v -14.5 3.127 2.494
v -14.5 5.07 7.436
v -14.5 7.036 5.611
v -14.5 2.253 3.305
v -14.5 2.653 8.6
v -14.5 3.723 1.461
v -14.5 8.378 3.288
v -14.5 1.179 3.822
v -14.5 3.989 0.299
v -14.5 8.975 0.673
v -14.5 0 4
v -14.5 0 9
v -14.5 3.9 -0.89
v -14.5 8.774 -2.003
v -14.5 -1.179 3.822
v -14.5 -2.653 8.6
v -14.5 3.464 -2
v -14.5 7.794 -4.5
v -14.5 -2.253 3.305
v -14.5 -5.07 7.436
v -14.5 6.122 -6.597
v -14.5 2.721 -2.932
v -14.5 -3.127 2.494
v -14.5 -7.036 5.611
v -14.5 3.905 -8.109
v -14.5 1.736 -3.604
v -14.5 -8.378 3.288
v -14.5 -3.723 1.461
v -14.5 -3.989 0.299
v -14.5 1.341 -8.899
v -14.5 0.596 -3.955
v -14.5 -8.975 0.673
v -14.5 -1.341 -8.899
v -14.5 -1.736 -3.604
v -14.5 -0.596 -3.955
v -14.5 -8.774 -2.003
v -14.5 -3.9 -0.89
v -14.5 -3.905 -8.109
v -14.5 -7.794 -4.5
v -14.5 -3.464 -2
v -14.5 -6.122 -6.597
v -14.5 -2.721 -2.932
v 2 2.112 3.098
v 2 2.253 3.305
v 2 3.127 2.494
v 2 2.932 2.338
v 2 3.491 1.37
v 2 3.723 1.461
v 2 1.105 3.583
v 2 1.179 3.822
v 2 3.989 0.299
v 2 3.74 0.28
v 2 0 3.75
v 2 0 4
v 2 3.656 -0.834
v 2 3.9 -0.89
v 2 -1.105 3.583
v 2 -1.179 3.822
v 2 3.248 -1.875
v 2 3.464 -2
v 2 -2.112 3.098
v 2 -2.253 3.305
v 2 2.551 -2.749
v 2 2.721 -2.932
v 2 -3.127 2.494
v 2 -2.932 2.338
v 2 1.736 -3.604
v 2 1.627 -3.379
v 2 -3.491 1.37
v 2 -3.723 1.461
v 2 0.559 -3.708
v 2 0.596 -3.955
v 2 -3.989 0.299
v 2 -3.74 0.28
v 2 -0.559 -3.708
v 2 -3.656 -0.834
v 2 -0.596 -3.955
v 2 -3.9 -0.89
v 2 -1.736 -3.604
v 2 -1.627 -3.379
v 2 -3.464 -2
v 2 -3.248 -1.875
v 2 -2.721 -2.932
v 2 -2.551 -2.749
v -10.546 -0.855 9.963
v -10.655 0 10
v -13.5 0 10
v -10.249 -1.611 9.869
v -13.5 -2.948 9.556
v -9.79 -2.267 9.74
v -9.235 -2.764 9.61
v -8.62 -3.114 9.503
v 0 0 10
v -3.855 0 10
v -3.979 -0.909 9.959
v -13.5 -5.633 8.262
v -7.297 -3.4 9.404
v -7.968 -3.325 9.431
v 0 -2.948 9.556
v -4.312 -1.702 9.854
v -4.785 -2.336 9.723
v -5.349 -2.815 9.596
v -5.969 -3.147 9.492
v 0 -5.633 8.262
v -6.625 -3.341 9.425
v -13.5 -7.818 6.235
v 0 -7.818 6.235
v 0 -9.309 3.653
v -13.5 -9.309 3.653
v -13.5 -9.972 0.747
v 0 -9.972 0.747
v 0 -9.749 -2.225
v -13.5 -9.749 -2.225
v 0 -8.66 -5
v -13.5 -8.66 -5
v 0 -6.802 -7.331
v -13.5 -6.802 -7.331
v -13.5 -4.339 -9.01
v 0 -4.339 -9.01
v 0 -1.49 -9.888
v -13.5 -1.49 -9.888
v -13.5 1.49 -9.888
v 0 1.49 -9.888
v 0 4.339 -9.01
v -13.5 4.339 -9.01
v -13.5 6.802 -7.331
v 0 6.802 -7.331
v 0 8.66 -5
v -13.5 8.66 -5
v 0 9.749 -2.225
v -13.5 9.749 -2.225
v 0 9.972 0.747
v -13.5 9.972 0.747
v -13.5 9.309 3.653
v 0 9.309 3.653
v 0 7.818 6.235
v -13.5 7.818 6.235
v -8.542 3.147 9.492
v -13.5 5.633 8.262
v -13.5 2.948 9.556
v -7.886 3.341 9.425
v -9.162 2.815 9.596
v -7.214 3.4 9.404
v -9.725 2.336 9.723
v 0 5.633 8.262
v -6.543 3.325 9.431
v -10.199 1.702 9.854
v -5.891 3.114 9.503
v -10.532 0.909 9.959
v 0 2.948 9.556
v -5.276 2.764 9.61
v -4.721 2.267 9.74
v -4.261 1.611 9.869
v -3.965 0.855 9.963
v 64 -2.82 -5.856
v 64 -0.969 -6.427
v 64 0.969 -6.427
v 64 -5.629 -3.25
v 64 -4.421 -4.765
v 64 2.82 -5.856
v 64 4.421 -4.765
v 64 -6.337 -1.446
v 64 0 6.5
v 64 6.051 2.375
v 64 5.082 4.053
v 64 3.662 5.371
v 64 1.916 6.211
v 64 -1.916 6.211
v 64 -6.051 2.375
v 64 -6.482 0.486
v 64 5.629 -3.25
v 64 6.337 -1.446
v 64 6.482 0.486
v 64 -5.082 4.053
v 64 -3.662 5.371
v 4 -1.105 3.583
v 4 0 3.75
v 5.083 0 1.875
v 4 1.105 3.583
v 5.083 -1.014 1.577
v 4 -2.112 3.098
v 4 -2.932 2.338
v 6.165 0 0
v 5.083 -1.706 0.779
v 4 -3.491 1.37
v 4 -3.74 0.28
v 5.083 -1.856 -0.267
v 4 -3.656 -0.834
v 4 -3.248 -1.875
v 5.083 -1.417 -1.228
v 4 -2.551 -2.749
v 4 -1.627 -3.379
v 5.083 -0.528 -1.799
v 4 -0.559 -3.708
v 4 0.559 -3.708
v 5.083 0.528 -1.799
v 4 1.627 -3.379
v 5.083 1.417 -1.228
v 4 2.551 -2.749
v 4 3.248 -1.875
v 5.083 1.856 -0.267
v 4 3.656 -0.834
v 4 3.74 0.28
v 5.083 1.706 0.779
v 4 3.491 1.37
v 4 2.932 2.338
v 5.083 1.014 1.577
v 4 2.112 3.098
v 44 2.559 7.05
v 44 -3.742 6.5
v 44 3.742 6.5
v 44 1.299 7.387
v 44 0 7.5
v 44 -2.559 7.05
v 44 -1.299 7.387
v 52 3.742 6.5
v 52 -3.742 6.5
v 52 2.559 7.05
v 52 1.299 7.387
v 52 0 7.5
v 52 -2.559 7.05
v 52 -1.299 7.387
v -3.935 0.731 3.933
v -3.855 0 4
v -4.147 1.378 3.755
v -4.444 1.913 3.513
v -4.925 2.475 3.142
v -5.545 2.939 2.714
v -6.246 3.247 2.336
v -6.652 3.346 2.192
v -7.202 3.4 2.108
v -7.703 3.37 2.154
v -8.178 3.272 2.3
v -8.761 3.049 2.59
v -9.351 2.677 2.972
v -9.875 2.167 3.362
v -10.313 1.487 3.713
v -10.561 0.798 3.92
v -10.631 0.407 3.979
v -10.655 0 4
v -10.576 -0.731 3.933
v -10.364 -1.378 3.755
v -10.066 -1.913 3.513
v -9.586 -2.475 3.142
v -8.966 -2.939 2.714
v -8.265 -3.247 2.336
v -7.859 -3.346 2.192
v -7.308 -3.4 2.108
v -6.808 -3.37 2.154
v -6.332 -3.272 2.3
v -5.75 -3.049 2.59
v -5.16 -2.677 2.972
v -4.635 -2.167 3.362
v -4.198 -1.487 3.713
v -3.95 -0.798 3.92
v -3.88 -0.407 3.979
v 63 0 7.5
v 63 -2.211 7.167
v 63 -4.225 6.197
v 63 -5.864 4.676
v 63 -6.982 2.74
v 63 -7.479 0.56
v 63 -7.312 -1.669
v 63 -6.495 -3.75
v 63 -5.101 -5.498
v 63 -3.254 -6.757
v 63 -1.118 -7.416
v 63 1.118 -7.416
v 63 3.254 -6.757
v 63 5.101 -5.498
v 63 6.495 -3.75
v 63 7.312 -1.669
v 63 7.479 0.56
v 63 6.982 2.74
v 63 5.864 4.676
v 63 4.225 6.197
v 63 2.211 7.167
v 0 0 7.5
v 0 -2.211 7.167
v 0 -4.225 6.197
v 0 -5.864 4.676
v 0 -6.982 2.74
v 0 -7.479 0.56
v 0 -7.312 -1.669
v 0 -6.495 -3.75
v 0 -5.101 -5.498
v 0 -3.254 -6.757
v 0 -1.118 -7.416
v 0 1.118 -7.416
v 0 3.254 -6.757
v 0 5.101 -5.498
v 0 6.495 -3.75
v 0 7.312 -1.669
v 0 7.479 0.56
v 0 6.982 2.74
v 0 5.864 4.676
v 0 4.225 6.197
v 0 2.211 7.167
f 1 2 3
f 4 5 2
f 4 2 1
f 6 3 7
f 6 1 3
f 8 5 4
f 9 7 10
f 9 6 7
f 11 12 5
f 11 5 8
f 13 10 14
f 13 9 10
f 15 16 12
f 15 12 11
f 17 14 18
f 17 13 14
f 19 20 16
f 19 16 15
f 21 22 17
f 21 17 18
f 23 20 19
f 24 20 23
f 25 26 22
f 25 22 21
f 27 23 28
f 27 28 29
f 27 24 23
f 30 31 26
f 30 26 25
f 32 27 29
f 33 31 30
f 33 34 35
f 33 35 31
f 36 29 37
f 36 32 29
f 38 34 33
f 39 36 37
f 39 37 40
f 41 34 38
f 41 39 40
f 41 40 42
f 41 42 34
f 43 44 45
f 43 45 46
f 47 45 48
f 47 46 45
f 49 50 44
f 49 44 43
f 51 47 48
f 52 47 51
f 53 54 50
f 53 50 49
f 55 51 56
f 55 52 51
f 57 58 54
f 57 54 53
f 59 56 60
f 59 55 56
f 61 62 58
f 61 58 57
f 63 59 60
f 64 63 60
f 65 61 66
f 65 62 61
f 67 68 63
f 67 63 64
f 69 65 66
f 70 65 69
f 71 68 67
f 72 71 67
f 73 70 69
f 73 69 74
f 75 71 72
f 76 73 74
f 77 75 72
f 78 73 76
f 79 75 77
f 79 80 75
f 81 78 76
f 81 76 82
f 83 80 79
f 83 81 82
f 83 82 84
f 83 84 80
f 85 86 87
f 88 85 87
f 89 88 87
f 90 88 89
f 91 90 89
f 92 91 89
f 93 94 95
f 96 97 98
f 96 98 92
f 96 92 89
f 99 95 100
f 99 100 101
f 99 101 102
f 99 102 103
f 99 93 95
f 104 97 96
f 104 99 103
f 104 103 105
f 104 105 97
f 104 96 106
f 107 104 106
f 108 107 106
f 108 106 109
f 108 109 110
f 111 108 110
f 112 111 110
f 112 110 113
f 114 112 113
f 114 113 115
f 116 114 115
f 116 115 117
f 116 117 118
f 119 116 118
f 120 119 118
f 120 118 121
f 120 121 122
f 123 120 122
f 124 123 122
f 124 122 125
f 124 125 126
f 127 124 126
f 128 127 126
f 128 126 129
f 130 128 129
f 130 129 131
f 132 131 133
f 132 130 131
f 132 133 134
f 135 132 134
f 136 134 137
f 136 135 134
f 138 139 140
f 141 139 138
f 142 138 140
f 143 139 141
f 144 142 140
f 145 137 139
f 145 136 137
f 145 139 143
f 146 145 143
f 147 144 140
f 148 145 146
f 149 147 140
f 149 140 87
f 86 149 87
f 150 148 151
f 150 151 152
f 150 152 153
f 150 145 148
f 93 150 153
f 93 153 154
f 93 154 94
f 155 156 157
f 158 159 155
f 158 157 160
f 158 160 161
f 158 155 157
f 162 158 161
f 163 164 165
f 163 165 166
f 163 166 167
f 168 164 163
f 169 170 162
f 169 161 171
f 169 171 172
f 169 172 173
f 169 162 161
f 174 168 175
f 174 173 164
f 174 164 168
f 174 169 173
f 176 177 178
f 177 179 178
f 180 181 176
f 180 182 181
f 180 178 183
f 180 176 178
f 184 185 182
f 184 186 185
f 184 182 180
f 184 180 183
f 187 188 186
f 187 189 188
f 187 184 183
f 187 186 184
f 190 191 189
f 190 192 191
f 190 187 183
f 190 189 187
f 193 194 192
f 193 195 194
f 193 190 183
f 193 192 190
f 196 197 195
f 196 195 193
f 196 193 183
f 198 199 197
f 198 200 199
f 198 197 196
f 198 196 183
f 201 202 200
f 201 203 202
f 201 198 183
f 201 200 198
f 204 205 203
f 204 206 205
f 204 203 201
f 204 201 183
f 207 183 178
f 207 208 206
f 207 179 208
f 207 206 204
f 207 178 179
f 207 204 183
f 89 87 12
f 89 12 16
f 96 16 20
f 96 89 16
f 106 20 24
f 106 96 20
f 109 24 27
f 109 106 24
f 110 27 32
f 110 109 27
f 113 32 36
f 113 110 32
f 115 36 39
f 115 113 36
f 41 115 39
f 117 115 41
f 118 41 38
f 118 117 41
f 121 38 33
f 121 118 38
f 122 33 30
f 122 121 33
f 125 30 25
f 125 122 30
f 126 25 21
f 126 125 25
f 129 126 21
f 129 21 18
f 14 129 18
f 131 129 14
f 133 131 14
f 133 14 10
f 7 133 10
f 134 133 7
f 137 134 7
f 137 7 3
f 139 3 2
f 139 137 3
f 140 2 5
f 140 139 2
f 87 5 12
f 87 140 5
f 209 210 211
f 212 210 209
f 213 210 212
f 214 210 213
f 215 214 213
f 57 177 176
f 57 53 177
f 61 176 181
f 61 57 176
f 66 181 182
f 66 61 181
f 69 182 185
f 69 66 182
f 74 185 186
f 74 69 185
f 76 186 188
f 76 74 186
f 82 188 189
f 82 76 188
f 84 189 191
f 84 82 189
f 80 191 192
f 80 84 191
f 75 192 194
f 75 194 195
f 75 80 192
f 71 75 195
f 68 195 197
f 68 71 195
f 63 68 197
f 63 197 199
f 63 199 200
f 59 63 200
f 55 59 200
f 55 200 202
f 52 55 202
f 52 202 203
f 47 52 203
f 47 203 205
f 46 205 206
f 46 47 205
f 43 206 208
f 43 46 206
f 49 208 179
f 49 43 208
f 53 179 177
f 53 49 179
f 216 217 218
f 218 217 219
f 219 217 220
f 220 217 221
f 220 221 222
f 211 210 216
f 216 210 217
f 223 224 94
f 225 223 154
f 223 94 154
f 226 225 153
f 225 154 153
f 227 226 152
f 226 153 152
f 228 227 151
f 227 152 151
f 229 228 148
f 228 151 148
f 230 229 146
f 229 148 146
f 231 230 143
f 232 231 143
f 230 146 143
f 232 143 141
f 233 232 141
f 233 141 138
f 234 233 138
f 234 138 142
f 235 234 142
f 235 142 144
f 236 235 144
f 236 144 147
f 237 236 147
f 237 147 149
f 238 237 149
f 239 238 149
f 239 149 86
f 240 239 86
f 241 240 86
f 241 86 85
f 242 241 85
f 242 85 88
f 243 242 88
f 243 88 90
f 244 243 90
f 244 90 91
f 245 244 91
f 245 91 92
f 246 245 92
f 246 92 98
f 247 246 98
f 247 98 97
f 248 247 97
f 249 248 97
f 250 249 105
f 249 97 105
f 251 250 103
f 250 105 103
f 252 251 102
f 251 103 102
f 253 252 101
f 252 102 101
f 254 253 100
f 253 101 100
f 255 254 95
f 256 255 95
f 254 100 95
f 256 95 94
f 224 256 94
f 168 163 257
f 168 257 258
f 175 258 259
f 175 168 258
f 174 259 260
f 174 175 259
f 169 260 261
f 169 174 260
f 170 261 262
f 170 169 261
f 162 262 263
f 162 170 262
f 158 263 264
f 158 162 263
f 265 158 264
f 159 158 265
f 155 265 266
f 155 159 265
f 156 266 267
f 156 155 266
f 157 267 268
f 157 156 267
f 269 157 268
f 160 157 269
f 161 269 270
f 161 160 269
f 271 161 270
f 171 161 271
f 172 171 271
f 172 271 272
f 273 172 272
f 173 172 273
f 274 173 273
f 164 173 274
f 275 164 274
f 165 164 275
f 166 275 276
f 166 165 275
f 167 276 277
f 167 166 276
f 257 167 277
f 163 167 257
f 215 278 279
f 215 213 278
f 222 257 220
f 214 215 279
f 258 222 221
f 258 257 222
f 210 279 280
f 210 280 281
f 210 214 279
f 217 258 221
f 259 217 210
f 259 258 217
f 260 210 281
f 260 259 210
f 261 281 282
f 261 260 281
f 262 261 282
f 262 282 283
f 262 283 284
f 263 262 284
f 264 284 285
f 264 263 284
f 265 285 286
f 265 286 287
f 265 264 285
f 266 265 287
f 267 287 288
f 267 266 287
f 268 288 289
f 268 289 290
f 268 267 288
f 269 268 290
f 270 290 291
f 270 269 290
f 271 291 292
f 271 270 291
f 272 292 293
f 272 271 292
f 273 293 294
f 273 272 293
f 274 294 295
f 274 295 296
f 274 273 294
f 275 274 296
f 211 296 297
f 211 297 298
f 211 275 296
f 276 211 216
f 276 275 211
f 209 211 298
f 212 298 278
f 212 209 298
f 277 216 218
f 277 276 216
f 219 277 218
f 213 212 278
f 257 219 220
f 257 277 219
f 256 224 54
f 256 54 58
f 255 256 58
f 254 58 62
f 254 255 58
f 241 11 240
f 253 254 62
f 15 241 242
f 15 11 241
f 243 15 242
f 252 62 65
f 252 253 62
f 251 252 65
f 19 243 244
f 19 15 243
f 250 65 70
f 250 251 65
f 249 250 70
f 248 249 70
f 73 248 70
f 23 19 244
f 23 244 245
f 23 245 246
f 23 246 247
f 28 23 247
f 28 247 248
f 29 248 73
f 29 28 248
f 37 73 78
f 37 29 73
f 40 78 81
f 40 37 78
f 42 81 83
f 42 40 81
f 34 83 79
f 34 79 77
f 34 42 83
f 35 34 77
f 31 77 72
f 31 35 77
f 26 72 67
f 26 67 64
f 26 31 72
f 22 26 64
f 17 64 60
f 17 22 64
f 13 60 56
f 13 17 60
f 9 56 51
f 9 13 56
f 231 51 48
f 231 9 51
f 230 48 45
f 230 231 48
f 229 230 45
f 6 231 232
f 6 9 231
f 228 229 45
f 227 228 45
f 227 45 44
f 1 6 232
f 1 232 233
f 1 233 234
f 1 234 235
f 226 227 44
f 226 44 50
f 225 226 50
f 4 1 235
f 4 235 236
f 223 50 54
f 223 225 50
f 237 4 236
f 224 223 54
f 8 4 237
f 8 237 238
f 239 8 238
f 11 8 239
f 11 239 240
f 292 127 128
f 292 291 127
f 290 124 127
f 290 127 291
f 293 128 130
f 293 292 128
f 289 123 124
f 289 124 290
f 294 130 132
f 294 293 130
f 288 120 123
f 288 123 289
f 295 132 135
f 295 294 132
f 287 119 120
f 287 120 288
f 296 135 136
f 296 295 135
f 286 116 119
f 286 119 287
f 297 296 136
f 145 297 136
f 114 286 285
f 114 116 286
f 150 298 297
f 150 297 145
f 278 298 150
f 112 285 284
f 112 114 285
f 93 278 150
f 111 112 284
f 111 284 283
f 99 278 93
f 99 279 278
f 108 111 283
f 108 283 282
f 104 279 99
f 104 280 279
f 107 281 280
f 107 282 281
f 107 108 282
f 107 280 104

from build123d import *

# Parameters (mm, degrees)
CHANFREIN1_SIZE              = 1
TROU_TARAUD_M81_REACH        = 76.682
TROU_TARAUD_M81_BORE_R       = 3.4
ENL_V_MAT_EXTRU_1_DEPTH      = 66.543878463
ENL_V_MAT_EXTRU_1_DEPTH_BACK = 66.543878463
ESQUISSE4_W                  = 8
ESQUISSE4_H                  = 2.832418839


with BuildPart() as part:
    # Esquisse1 → Révolution1 (revolve)
    with BuildSketch(Plane.XY, mode=Mode.PRIVATE) as r_volution1_sk:
        Polygon((-14.5, 4), (-14.5, 10), (0, 10), (0, 7.5), (64, 7.5), (64, 0), (6.165063509, 0), (4, 3.75), (2, 3.75), (2, 4), align=None)
    revolve(r_volution1_sk.sketch.rotate(Axis((-22.202680924, 0, 0), (1, 0, 0)), 90), axis=Axis((-22.202680924, 0, 0), (1, 0, 0)))

    # Chanfrein1
    chanfrein1_edges = [part.edges().sort_by_distance(p)[0] for p in [
        (64, 0, -7.5),
        (-14.5, 0, -10),
    ]]
    chamfer(chanfrein1_edges, length=CHANFREIN1_SIZE)

    # Trou taraudé M81 bore (on position points) → Trou taraudé M81 (cut, up to next)
    with BuildSketch(Plane(origin=(-7.255410761, 0, 10), x_dir=(1, 0, 0), z_dir=(0, 0, 1)), mode=Mode.PRIVATE) as trou_taraud_m81_sk1:
        Circle(TROU_TARAUD_M81_BORE_R)
    trou_taraud_m81_tool1 = extrude(trou_taraud_m81_sk1.sketch, amount=-TROU_TARAUD_M81_REACH, mode=Mode.PRIVATE) & part.part
    add(trou_taraud_m81_tool1.solids().sort_by_distance((-7.255411, 0, 10))[0], mode=Mode.SUBTRACT)

    # Esquisse4 → Enlèv. mat.-Extru.1 (cut, two sides: drawn at the far end of the back side and taken through both)
    with BuildSketch(Plane(origin=(0, 0, 0), x_dir=(1, 0, 0), z_dir=(0, 1, 0)).offset(-ENL_V_MAT_EXTRU_1_DEPTH_BACK)):
        with Locations((48, -7.91620942)):
            Rectangle(ESQUISSE4_W, ESQUISSE4_H)
    extrude(amount=ENL_V_MAT_EXTRU_1_DEPTH + ENL_V_MAT_EXTRU_1_DEPTH_BACK, mode=Mode.SUBTRACT)


solid = part.part
